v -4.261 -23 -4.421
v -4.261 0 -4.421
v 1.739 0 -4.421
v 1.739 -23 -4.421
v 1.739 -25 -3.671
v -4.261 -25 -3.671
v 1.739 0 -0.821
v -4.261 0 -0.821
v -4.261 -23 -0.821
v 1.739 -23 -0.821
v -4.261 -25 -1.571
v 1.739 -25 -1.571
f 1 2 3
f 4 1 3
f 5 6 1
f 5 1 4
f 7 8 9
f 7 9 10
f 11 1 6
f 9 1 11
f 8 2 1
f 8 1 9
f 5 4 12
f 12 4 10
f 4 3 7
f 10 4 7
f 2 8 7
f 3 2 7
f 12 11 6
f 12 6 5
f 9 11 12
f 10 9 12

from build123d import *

# Parameters (mm, degrees)
F0_W     = 6
F0_H     = 3.6
F1_DEPTH = 25
F2_SIZE2 = 0.75
F2_SIZE  = 2


with BuildPart() as f1:
    # F0 (on Front) → F1 (new body)
    with BuildSketch(Plane.XZ):
        with Locations((-1.260776, -2.620722)):
            Rectangle(F0_W, F0_H)
    extrude(amount=F1_DEPTH)

    # F2
    f2_edges = [f1.edges().sort_by_distance(p)[0] for p in [
        (-1.260776, -25, -0.820722),
        (-1.260776, -25, -4.420722),
    ]]
    chamfer(f2_edges, length=F2_SIZE, length2=F2_SIZE2)


solid = f1.part
